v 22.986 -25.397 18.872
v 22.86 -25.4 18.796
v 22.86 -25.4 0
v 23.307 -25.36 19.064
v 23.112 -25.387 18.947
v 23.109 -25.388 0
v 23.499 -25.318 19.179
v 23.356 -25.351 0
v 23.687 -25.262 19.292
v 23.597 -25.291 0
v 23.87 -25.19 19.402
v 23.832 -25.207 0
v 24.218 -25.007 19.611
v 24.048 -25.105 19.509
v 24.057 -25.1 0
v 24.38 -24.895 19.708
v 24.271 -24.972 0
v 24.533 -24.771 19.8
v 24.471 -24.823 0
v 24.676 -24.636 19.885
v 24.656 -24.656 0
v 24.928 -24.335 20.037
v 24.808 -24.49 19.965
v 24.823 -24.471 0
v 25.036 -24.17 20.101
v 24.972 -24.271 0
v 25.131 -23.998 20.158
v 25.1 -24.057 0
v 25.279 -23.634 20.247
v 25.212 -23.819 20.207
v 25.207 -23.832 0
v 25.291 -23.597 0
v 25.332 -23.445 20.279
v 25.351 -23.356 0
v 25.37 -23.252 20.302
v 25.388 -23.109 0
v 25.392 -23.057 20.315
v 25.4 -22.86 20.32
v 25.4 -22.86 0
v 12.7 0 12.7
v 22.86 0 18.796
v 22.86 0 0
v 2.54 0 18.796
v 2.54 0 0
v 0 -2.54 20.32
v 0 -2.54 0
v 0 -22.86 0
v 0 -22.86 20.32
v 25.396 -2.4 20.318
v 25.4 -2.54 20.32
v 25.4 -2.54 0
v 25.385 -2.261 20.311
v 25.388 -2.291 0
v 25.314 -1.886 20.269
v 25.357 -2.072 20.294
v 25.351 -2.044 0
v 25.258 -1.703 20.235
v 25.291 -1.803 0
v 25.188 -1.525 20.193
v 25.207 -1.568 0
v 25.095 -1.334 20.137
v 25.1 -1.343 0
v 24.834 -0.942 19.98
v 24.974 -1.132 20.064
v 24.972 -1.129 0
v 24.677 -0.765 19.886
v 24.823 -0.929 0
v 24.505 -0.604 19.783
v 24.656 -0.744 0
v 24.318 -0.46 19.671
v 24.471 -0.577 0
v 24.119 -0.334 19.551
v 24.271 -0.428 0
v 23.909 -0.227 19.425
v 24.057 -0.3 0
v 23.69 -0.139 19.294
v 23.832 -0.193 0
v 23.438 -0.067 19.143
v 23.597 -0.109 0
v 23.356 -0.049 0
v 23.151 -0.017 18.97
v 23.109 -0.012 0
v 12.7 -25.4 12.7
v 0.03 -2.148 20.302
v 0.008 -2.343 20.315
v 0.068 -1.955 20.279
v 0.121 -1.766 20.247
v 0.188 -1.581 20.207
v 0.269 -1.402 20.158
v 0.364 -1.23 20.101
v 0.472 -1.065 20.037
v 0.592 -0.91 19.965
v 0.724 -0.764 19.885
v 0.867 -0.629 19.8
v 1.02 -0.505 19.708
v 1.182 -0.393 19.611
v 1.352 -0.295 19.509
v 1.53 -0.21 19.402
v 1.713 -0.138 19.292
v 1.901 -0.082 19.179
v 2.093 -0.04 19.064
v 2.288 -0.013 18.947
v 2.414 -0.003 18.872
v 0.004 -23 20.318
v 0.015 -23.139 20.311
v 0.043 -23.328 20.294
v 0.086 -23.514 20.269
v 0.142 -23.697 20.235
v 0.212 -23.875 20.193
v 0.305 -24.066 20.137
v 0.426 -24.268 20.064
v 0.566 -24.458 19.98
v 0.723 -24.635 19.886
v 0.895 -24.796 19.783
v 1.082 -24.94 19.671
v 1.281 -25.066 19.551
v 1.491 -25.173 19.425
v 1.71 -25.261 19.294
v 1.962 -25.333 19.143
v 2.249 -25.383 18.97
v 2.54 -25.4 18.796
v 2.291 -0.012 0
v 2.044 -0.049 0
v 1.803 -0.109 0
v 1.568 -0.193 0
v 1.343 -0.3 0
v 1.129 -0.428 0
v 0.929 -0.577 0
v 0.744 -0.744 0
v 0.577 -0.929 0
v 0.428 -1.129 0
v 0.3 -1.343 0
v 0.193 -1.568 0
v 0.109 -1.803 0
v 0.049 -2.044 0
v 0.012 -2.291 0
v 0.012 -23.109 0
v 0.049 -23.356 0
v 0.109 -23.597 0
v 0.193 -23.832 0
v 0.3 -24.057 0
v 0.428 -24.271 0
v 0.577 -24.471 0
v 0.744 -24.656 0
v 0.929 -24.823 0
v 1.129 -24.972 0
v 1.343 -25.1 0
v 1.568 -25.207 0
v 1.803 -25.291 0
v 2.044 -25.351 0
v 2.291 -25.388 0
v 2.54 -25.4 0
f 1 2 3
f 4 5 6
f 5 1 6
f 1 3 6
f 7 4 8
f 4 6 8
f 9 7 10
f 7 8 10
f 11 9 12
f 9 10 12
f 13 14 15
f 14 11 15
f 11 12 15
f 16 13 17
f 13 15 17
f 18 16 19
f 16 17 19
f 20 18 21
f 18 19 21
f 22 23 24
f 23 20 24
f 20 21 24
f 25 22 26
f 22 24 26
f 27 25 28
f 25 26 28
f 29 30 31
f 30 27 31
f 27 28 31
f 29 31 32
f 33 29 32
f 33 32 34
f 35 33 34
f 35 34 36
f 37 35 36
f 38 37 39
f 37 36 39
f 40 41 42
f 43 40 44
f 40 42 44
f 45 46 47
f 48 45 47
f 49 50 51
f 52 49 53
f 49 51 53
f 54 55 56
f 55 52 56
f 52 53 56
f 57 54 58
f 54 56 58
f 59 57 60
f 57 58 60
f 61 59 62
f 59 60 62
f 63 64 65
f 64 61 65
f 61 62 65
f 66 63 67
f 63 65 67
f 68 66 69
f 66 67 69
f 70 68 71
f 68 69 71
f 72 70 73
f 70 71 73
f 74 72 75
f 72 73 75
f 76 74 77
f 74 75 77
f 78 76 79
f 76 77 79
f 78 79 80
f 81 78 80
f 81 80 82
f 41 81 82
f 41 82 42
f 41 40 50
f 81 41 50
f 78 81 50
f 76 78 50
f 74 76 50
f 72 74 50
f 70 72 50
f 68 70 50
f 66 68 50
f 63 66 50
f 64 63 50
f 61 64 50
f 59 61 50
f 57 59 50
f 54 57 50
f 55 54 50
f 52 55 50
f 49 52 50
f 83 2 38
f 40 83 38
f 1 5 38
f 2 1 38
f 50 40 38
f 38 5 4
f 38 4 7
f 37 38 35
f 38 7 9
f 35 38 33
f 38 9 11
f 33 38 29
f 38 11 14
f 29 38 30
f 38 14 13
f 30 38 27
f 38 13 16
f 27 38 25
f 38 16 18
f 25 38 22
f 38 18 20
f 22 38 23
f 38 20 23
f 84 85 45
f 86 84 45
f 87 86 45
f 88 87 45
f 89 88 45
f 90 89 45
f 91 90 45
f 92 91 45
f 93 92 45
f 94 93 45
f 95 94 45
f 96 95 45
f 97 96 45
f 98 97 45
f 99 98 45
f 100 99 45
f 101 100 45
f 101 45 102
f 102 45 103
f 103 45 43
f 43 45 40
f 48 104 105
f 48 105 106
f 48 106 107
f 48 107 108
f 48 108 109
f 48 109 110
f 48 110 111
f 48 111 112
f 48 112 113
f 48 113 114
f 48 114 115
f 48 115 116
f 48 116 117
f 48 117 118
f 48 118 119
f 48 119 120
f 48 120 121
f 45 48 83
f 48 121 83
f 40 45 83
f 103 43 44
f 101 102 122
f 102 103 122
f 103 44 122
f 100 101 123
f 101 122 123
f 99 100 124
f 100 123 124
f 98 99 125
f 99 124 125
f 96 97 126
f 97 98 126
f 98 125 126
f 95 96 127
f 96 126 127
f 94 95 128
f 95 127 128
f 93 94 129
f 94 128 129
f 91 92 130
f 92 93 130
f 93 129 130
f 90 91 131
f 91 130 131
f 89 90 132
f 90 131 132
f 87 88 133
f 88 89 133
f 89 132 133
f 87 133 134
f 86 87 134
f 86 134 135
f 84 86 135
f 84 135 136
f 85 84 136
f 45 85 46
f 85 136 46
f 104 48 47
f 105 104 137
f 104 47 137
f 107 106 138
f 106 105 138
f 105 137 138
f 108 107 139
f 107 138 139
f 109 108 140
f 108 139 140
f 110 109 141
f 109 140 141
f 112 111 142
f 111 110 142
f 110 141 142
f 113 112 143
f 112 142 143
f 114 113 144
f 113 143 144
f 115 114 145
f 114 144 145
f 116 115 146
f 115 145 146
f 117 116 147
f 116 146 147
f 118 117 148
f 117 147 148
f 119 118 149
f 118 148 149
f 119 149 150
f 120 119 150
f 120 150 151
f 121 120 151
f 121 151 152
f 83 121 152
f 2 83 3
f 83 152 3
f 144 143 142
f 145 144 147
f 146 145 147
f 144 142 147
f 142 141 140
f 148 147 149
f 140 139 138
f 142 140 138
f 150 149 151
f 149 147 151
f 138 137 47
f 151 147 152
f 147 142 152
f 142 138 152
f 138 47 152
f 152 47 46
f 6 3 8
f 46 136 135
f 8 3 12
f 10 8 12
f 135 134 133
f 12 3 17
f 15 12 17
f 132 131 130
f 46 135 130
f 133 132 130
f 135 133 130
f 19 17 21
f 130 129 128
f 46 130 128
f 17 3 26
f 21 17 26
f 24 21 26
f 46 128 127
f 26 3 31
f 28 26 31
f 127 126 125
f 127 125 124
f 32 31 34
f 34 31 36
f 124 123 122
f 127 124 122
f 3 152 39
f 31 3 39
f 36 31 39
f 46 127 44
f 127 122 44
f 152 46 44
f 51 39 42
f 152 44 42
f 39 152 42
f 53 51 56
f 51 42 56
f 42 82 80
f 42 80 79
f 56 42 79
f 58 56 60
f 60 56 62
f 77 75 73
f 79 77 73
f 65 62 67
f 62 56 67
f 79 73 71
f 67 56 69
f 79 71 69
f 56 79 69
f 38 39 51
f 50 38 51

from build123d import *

# Parameters (mm, degrees)
F1_DEPTH = 20.32
F4_DEPTH = 25.4


with BuildPart() as f1:
    # F0 (on Top) → F1 (new body)
    with BuildSketch(Plane.XY):
        with BuildLine():
            Line((22.86, 0), (2.54, 0))
            ThreePointArc((2.54, 0), (0.7439487758, -0.7439487758), (0, -2.54))
            Line((0, -2.54), (0, -22.86))
            ThreePointArc((0, -22.86), (0.7439487758, -24.6560512242), (2.54, -25.4))
            Line((2.54, -25.4), (22.86, -25.4))
            ThreePointArc((22.86, -25.4), (24.6560512242, -24.6560512242), (25.4, -22.86))
            Line((25.4, -22.86), (25.4, -2.54))
            ThreePointArc((25.4, -2.54), (24.6560512242, -0.7439487758), (22.86, 0))
        make_face()
    extrude(amount=F1_DEPTH)

    # F2 (on face) → F4 (cut)
    with BuildSketch(Plane.XZ.offset(25.4)):
        Polygon((2.54, 18.796), (12.7, 12.7), (22.86, 18.796), (22.86, 20.32), (2.54, 20.32), align=None)
        Polygon((0, 20.32), (2.54, 18.796), (2.54, 20.32), align=None)
        Polygon((22.86, 20.32), (22.86, 18.796), (25.4, 20.32), align=None)
    extrude(amount=-F4_DEPTH, mode=Mode.SUBTRACT)


solid = f1.part
